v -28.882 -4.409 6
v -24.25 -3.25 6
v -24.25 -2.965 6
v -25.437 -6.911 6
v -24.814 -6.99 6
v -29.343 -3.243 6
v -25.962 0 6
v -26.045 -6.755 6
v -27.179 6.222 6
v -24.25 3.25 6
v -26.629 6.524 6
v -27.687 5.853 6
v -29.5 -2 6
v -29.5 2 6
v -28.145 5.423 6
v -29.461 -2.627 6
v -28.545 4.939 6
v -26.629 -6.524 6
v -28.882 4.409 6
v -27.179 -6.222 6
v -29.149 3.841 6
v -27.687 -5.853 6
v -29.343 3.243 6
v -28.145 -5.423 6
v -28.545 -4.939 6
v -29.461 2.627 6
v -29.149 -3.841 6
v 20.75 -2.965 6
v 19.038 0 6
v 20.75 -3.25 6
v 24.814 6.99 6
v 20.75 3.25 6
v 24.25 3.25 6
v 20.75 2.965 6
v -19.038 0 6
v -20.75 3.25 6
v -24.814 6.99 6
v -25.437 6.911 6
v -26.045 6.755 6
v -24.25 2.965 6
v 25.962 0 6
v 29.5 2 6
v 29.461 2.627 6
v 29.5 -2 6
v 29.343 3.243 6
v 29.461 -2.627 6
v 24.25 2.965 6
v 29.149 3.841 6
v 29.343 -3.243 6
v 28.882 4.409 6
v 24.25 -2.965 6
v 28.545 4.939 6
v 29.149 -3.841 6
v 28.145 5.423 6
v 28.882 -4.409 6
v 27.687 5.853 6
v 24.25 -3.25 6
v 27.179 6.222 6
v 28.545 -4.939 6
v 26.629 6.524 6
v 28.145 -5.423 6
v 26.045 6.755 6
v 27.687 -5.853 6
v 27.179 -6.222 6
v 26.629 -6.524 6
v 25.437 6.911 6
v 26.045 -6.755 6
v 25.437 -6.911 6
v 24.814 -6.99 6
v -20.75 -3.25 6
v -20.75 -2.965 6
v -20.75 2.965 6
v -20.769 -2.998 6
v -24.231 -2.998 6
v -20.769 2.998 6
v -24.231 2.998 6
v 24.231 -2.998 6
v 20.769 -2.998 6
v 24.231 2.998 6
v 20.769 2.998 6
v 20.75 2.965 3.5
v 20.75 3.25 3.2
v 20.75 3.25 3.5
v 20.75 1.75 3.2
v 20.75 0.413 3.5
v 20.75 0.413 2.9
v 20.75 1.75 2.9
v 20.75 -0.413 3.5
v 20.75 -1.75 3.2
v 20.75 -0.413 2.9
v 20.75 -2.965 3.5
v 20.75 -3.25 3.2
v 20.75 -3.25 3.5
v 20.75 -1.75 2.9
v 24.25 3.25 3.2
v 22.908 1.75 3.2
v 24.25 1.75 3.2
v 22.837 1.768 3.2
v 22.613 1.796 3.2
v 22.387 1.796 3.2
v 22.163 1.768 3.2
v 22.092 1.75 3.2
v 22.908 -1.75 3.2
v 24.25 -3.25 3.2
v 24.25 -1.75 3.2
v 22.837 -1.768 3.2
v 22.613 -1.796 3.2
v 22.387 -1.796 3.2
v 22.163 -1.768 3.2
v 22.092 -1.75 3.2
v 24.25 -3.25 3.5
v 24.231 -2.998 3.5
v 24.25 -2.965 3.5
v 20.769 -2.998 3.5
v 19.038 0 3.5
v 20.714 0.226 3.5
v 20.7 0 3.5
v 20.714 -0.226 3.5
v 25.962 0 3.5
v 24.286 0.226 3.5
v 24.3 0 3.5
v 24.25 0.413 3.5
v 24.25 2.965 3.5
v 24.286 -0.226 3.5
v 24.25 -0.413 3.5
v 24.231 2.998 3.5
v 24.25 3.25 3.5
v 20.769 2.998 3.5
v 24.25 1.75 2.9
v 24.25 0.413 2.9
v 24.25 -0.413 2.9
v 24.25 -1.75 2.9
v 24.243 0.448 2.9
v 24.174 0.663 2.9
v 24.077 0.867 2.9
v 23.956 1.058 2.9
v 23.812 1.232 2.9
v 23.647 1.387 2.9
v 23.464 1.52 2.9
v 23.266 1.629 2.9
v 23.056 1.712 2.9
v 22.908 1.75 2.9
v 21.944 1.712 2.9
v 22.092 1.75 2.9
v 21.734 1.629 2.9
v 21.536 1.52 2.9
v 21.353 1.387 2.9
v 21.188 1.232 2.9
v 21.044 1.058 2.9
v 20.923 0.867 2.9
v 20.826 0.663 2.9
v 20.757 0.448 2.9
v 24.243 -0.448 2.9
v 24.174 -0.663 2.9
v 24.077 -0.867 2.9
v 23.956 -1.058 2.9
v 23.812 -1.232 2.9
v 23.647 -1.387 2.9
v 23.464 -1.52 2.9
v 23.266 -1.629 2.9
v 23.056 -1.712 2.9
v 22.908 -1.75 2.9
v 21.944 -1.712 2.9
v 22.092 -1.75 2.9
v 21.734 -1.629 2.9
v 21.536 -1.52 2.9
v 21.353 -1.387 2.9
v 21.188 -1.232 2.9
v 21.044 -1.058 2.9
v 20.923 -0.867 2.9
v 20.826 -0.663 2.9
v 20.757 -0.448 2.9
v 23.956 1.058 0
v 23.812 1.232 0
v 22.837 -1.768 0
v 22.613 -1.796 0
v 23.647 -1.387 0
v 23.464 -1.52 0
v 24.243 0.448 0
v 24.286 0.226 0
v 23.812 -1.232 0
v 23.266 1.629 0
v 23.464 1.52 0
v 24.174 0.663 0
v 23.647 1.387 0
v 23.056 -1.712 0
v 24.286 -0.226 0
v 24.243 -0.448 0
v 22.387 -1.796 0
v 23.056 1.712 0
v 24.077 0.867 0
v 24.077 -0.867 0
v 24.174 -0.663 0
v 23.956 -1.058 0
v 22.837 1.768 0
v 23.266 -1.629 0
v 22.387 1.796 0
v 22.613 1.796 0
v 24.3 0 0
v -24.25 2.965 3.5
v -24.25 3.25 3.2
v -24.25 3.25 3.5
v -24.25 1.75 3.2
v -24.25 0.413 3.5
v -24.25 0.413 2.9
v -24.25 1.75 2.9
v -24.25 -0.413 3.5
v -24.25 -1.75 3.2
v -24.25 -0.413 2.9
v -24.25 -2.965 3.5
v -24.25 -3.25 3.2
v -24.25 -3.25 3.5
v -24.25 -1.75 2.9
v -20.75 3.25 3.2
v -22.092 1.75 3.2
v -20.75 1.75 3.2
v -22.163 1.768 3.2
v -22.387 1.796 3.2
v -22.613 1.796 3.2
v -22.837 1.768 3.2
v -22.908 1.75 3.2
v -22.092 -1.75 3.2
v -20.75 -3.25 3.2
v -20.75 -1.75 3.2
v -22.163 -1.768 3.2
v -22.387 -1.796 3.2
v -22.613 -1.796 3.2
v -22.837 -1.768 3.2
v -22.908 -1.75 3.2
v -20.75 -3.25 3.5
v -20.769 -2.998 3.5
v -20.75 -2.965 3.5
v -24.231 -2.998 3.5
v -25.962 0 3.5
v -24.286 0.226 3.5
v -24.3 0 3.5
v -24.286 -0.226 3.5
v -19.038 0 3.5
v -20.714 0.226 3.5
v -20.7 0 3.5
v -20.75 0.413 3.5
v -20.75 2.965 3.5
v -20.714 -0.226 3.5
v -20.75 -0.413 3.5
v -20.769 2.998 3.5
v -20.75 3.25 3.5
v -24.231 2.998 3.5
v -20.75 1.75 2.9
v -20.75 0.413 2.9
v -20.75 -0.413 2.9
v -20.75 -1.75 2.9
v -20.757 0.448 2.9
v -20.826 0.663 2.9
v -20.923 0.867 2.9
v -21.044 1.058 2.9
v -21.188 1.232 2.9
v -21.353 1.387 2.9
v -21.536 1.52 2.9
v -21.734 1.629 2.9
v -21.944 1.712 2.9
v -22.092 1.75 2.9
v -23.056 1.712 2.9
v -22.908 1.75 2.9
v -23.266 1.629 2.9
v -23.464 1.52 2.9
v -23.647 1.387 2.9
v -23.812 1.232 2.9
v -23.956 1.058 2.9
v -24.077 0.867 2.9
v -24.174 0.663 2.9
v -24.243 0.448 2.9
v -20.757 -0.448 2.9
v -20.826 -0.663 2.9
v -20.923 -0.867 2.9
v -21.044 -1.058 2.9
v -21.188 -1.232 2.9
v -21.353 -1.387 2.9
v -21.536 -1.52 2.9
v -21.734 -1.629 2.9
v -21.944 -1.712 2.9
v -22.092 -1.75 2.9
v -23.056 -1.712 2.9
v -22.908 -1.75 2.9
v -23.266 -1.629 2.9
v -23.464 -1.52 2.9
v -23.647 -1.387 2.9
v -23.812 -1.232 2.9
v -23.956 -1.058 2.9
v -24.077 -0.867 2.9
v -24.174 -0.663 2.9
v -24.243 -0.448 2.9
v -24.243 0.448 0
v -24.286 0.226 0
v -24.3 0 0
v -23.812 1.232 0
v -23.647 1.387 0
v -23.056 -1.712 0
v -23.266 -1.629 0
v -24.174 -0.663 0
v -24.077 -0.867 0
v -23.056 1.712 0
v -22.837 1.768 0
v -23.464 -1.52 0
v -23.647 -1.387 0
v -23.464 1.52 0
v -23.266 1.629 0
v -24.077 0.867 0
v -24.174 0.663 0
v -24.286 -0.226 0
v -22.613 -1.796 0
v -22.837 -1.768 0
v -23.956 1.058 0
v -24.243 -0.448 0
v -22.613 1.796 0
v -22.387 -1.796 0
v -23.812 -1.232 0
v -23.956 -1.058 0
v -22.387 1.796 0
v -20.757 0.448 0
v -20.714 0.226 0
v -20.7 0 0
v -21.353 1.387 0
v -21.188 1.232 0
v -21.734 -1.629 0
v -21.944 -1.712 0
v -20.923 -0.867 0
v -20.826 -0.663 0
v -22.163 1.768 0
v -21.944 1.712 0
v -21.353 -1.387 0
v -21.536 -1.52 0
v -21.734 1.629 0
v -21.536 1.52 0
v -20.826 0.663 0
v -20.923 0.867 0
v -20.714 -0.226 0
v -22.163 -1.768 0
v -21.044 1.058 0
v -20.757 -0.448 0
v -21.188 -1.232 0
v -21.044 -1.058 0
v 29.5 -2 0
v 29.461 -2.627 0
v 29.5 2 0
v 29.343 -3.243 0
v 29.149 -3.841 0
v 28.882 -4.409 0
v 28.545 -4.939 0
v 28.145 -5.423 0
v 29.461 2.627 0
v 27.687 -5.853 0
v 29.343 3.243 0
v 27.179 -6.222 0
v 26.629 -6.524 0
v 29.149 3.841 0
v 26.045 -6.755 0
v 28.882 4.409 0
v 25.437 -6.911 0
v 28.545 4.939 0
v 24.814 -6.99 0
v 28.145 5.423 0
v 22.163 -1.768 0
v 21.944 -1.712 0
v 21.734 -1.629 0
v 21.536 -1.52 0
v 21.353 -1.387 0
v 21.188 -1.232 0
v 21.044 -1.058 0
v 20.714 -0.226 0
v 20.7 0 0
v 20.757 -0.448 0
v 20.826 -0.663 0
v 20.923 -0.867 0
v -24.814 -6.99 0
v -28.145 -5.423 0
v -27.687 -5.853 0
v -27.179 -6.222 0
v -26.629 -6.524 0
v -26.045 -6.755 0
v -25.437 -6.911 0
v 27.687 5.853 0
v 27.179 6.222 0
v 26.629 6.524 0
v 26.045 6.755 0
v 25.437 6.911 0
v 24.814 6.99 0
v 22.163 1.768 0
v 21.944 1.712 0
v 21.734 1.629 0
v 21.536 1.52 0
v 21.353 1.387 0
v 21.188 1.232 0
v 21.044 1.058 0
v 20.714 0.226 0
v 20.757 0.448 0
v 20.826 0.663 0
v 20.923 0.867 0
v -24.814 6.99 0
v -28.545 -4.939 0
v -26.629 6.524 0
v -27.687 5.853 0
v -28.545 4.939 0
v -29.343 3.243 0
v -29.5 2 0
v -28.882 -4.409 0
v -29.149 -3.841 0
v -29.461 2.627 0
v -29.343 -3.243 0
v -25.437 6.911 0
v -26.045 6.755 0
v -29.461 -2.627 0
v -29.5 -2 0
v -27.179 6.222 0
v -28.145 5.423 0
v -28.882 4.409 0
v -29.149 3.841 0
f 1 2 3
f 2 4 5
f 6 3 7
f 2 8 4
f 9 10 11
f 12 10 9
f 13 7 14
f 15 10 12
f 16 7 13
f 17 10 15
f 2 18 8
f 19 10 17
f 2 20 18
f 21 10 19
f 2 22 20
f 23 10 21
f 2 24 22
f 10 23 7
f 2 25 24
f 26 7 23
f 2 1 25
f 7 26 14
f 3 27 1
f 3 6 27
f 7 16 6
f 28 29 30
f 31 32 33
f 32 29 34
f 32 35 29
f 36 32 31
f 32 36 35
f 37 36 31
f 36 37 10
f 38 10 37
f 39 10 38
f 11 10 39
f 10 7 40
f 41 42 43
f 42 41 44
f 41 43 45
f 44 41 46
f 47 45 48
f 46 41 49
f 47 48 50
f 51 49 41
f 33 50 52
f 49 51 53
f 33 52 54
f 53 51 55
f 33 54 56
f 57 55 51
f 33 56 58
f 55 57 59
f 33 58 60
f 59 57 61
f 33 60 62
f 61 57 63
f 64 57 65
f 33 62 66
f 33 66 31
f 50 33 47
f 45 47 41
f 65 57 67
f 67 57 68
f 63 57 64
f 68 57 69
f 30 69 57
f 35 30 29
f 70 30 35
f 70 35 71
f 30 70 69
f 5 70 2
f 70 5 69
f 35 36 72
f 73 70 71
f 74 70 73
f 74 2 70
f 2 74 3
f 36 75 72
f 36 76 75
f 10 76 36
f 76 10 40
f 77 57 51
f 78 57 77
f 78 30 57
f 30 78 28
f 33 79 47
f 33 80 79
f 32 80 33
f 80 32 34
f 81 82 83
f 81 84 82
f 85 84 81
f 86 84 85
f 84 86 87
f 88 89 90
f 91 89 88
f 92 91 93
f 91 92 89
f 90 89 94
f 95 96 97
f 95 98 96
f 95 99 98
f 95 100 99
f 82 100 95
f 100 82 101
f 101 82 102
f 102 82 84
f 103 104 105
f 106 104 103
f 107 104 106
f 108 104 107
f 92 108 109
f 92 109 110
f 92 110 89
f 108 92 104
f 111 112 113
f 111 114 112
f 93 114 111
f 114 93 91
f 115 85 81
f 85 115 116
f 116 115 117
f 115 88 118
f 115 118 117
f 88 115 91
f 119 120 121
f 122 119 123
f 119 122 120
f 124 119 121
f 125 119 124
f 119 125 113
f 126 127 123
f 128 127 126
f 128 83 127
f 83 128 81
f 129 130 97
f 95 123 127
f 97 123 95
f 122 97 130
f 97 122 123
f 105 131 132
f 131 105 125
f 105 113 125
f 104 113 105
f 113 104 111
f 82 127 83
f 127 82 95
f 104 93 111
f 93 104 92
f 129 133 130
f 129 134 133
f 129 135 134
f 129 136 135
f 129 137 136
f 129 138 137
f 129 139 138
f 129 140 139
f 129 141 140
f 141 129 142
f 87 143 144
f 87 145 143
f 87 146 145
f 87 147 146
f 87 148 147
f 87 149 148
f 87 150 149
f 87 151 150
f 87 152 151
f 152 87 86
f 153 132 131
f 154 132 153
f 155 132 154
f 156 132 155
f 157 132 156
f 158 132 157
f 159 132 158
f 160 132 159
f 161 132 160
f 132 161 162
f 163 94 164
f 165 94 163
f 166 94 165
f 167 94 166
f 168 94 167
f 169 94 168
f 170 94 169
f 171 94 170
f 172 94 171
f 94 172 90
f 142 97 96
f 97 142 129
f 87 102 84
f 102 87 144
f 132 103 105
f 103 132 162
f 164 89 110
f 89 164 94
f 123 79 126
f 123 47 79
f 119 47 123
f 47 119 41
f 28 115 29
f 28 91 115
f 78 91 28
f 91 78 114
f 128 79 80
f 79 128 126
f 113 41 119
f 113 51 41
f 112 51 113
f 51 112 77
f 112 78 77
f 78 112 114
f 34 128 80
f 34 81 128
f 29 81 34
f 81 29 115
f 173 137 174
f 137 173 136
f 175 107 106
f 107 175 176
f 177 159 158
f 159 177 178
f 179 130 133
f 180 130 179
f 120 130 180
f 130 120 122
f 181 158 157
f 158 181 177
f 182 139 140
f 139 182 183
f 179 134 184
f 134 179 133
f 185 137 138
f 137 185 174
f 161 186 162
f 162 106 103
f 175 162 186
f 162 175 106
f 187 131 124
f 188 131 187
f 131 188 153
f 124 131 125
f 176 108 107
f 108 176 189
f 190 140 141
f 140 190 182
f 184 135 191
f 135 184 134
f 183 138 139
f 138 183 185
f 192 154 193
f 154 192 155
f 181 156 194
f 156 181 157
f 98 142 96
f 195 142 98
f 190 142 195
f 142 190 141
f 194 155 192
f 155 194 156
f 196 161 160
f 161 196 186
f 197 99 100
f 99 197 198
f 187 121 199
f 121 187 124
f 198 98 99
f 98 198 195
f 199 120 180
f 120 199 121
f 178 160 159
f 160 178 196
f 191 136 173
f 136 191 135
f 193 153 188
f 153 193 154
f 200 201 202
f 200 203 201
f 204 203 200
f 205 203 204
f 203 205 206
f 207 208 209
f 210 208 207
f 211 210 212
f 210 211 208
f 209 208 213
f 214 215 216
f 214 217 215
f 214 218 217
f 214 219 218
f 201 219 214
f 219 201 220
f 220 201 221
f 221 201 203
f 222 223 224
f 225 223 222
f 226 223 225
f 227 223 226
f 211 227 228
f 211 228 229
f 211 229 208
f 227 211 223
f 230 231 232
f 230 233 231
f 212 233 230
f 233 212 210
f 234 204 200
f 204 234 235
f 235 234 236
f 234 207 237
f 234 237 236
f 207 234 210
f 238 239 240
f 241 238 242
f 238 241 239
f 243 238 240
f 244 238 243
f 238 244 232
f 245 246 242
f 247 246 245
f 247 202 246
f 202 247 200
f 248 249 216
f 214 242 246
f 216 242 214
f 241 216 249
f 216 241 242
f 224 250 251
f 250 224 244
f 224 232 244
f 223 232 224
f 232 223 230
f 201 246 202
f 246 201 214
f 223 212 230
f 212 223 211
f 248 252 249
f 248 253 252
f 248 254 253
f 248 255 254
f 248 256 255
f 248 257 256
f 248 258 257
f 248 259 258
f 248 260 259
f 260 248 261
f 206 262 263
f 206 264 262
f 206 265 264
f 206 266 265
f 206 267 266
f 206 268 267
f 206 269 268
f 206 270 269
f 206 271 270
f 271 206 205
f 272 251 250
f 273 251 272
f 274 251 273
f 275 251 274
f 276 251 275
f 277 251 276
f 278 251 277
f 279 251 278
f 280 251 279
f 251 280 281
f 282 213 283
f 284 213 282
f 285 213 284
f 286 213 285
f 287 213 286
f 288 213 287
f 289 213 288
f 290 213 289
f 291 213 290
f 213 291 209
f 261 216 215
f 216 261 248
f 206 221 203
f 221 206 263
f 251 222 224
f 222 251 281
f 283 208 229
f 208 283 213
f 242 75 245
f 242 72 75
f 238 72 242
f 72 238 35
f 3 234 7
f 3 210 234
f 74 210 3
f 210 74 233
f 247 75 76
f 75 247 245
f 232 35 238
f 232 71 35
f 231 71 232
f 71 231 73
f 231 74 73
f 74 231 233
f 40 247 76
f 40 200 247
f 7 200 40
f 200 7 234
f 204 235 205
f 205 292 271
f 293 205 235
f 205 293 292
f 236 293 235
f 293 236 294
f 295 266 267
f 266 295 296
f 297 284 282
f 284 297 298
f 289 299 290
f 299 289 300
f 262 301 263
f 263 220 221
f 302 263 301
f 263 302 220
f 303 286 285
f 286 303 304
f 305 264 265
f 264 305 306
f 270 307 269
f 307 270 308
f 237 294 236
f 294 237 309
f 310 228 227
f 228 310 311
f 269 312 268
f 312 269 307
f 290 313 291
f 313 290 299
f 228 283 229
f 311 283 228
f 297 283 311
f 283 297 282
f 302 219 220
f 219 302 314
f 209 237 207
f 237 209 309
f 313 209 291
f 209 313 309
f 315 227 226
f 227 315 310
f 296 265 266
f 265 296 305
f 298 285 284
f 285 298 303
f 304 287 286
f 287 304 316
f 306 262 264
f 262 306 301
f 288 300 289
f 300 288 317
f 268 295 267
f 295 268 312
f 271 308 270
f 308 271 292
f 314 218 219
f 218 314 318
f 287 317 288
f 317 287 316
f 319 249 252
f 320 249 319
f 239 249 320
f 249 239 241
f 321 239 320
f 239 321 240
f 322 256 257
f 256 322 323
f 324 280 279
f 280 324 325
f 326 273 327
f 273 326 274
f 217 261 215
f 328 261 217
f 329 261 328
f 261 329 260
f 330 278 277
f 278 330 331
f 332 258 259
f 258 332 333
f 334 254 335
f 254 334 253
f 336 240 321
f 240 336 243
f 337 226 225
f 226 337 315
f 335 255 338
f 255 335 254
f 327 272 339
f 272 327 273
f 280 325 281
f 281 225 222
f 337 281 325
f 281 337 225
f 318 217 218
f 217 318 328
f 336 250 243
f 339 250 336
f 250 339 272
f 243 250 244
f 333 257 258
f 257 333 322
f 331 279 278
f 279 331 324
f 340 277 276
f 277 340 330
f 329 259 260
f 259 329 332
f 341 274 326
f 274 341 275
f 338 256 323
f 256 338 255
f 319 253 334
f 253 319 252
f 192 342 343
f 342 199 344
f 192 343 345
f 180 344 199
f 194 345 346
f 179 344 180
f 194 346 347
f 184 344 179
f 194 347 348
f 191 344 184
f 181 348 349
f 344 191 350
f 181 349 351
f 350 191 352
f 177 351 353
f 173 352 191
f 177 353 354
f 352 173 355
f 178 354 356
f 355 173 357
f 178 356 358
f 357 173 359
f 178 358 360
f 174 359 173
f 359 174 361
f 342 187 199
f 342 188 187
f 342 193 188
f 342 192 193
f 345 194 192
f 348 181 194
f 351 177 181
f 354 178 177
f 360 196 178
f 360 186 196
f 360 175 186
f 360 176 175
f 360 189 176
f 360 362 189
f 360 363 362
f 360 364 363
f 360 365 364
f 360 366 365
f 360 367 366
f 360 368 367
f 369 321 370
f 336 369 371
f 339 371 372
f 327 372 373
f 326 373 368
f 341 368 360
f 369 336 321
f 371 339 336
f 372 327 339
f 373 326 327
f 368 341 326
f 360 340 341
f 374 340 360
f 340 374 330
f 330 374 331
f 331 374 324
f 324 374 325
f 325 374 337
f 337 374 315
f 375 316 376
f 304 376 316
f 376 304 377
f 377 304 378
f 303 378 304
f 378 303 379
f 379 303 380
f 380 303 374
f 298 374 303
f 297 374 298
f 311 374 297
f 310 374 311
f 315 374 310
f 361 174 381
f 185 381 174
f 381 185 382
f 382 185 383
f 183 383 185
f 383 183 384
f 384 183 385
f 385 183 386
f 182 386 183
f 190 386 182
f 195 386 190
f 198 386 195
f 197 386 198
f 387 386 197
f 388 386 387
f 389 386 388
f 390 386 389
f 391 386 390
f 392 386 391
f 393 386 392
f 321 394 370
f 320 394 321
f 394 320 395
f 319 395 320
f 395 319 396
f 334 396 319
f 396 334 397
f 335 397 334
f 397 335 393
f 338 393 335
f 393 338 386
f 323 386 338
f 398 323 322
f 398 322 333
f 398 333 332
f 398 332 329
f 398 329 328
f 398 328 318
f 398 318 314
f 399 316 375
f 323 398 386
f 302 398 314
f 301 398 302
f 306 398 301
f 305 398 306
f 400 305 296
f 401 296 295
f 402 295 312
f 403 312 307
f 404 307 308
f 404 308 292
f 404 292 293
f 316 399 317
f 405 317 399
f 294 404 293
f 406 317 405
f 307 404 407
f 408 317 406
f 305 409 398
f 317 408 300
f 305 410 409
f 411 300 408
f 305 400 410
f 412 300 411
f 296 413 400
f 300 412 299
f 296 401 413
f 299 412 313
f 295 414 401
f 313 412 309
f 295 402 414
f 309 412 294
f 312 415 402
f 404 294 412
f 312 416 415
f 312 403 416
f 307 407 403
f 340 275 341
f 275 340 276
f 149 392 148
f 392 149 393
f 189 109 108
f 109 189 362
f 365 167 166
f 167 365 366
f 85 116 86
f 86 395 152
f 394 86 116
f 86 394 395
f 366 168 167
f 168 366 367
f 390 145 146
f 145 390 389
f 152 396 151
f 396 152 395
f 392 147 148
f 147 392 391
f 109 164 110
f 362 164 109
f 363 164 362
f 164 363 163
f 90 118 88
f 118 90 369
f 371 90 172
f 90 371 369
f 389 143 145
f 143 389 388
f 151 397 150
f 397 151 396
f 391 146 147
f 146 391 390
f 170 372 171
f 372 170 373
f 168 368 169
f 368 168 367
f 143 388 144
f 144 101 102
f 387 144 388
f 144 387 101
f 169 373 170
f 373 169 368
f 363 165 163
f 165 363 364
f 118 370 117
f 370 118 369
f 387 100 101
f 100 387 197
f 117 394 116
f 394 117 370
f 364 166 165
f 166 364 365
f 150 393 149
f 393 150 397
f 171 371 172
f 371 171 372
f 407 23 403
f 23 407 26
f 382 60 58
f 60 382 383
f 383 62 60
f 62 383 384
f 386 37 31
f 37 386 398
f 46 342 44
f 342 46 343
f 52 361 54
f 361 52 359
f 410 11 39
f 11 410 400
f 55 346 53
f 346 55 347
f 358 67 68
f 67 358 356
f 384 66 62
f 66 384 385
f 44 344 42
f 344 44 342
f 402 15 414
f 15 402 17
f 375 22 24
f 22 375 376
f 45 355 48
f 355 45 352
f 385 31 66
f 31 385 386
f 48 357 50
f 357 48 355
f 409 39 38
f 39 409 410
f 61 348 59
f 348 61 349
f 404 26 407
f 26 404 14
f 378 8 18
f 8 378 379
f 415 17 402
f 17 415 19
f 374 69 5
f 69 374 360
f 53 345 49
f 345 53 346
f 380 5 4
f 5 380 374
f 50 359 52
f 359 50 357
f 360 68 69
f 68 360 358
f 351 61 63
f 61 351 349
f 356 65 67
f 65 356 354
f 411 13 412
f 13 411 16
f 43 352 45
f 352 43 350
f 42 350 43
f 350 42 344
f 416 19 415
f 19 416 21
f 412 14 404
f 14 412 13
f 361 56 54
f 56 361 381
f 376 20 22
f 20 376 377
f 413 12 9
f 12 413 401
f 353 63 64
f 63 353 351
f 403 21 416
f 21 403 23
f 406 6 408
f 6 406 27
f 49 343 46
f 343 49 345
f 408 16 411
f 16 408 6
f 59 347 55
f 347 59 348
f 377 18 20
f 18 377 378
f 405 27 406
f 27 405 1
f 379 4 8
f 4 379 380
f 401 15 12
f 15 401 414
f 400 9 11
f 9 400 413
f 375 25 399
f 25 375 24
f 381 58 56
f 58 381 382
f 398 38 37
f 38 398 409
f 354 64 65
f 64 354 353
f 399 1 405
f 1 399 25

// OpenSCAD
$fn = 50;


difference() {
	union() {
		hull() {
			translate(v = [-24.5000000000, 2.0000000000, 0]) {
				cylinder(h = 6, r = 5);
			}
			translate(v = [24.5000000000, 2.0000000000, 0]) {
				cylinder(h = 6, r = 5);
			}
			translate(v = [-24.5000000000, -2.0000000000, 0]) {
				cylinder(h = 6, r = 5);
			}
			translate(v = [24.5000000000, -2.0000000000, 0]) {
				cylinder(h = 6, r = 5);
			}
		}
	}
	union() {
		translate(v = [22.5000000000, 0, -20]) {
			rotate(a = [0, 180, 0]) {
				difference() {
					union() {
						translate(v = [0, 0, -26.0000000000]) {
							rotate(a = [0, 0, 0]) {
								difference() {
									union() {
										#translate(v = [-1.7500000000, -3.2500000000, -0.3000000000]) {
											cube(size = [3.5000000000, 6.5000000000, 0.3000000000]);
										}
										#translate(v = [-1.7500000000, -1.7500000000, -0.6000000000]) {
											cube(size = [3.5000000000, 3.5000000000, 0.3000000000]);
										}
										#translate(v = [-1.7500000000, -3.2500000000, 2.5000000000]) {
											cube(size = [3.5000000000, 6.5000000000, 0.3000000000]);
										}
										#translate(v = [-1.7500000000, -1.7500000000, 2.8000000000]) {
											cube(size = [3.5000000000, 3.5000000000, 0.3000000000]);
										}
										#linear_extrude(height = 2.5000000000) {
											polygon(points = [[3.4620000000, 0.0000000000], [1.7310000000, 2.9981799479], [-1.7310000000, 2.9981799479], [-3.4620000000, 0.0000000000], [-1.7310000000, -2.9981799479], [1.7310000000, -2.9981799479]]);
										}
										#translate(v = [-1.7500000000, -3.2500000000, -0.3000000000]) {
											cube(size = [3.5000000000, 6.5000000000, 0.3000000000]);
										}
										#translate(v = [-1.7500000000, -1.7500000000, -0.6000000000]) {
											cube(size = [3.5000000000, 3.5000000000, 0.3000000000]);
										}
										#translate(v = [-1.7500000000, -3.2500000000, 2.5000000000]) {
											cube(size = [3.5000000000, 6.5000000000, 0.3000000000]);
										}
										#translate(v = [-1.7500000000, -1.7500000000, 2.8000000000]) {
											cube(size = [3.5000000000, 3.5000000000, 0.3000000000]);
										}
										#translate(v = [-1.7500000000, -3.2500000000, -0.3000000000]) {
											cube(size = [3.5000000000, 6.5000000000, 0.3000000000]);
										}
										#translate(v = [-1.7500000000, -1.7500000000, -0.6000000000]) {
											cube(size = [3.5000000000, 3.5000000000, 0.3000000000]);
										}
										#translate(v = [-1.7500000000, -3.2500000000, 2.5000000000]) {
											cube(size = [3.5000000000, 6.5000000000, 0.3000000000]);
										}
										#translate(v = [-1.7500000000, -1.7500000000, 2.8000000000]) {
											cube(size = [3.5000000000, 3.5000000000, 0.3000000000]);
										}
									}
									union();
								}
							}
						}
						translate(v = [0, 0, -26.0000000000]) {
							rotate(a = [0, 0, 0]) {
								difference() {
									union() {
										#translate(v = [-1.7500000000, -3.2500000000, -0.3000000000]) {
											cube(size = [3.5000000000, 6.5000000000, 0.3000000000]);
										}
										#translate(v = [-1.7500000000, -1.7500000000, -0.6000000000]) {
											cube(size = [3.5000000000, 3.5000000000, 0.3000000000]);
										}
										#translate(v = [-1.7500000000, -3.2500000000, 2.5000000000]) {
											cube(size = [3.5000000000, 6.5000000000, 0.3000000000]);
										}
										#translate(v = [-1.7500000000, -1.7500000000, 2.8000000000]) {
											cube(size = [3.5000000000, 3.5000000000, 0.3000000000]);
										}
										#linear_extrude(height = 2.5000000000) {
											polygon(points = [[3.4620000000, 0.0000000000], [1.7310000000, 2.9981799479], [-1.7310000000, 2.9981799479], [-3.4620000000, 0.0000000000], [-1.7310000000, -2.9981799479], [1.7310000000, -2.9981799479]]);
										}
										#translate(v = [-1.7500000000, -3.2500000000, -0.3000000000]) {
											cube(size = [3.5000000000, 6.5000000000, 0.3000000000]);
										}
										#translate(v = [-1.7500000000, -1.7500000000, -0.6000000000]) {
											cube(size = [3.5000000000, 3.5000000000, 0.3000000000]);
										}
										#translate(v = [-1.7500000000, -3.2500000000, 2.5000000000]) {
											cube(size = [3.5000000000, 6.5000000000, 0.3000000000]);
										}
										#translate(v = [-1.7500000000, -1.7500000000, 2.8000000000]) {
											cube(size = [3.5000000000, 3.5000000000, 0.3000000000]);
										}
										#translate(v = [-1.7500000000, -3.2500000000, -0.3000000000]) {
											cube(size = [3.5000000000, 6.5000000000, 0.3000000000]);
										}
										#translate(v = [-1.7500000000, -1.7500000000, -0.6000000000]) {
											cube(size = [3.5000000000, 3.5000000000, 0.3000000000]);
										}
										#translate(v = [-1.7500000000, -3.2500000000, 2.5000000000]) {
											cube(size = [3.5000000000, 6.5000000000, 0.3000000000]);
										}
										#translate(v = [-1.7500000000, -1.7500000000, 2.8000000000]) {
											cube(size = [3.5000000000, 3.5000000000, 0.3000000000]);
										}
									}
									union();
								}
							}
						}
						translate(v = [0, 0, -26.0000000000]) {
							rotate(a = [0, 0, 0]) {
								difference() {
									union() {
										#translate(v = [-1.7500000000, -3.2500000000, -0.3000000000]) {
											cube(size = [3.5000000000, 6.5000000000, 0.3000000000]);
										}
										#translate(v = [-1.7500000000, -1.7500000000, -0.6000000000]) {
											cube(size = [3.5000000000, 3.5000000000, 0.3000000000]);
										}
										#translate(v = [-1.7500000000, -3.2500000000, 2.5000000000]) {
											cube(size = [3.5000000000, 6.5000000000, 0.3000000000]);
										}
										#translate(v = [-1.7500000000, -1.7500000000, 2.8000000000]) {
											cube(size = [3.5000000000, 3.5000000000, 0.3000000000]);
										}
										#linear_extrude(height = 2.5000000000) {
											polygon(points = [[3.4620000000, 0.0000000000], [1.7310000000, 2.9981799479], [-1.7310000000, 2.9981799479], [-3.4620000000, 0.0000000000], [-1.7310000000, -2.9981799479], [1.7310000000, -2.9981799479]]);
										}
										#translate(v = [-1.7500000000, -3.2500000000, -0.3000000000]) {
											cube(size = [3.5000000000, 6.5000000000, 0.3000000000]);
										}
										#translate(v = [-1.7500000000, -1.7500000000, -0.6000000000]) {
											cube(size = [3.5000000000, 3.5000000000, 0.3000000000]);
										}
										#translate(v = [-1.7500000000, -3.2500000000, 2.5000000000]) {
											cube(size = [3.5000000000, 6.5000000000, 0.3000000000]);
										}
										#translate(v = [-1.7500000000, -1.7500000000, 2.8000000000]) {
											cube(size = [3.5000000000, 3.5000000000, 0.3000000000]);
										}
										#translate(v = [-1.7500000000, -3.2500000000, -0.3000000000]) {
											cube(size = [3.5000000000, 6.5000000000, 0.3000000000]);
										}
										#translate(v = [-1.7500000000, -1.7500000000, -0.6000000000]) {
											cube(size = [3.5000000000, 3.5000000000, 0.3000000000]);
										}
										#translate(v = [-1.7500000000, -3.2500000000, 2.5000000000]) {
											cube(size = [3.5000000000, 6.5000000000, 0.3000000000]);
										}
										#translate(v = [-1.7500000000, -1.7500000000, 2.8000000000]) {
											cube(size = [3.5000000000, 3.5000000000, 0.3000000000]);
										}
									}
									union();
								}
							}
						}
						#translate(v = [0, 0, -26.0000000000]) {
							cylinder(h = 26, r = 1.5000000000);
						}
						#translate(v = [0, 0, -1.9000000000]) {
							cylinder(h = 1.9000000000, r1 = 1.8000000000, r2 = 3.6000000000);
						}
						#translate(v = [0, 0, -26.0000000000]) {
							cylinder(h = 26, r = 1.8000000000);
						}
						#translate(v = [0, 0, -26.0000000000]) {
							cylinder(h = 26, r = 1.5000000000);
						}
					}
					union();
				}
			}
		}
		translate(v = [-22.5000000000, 0, -20]) {
			rotate(a = [0, 180, 0]) {
				difference() {
					union() {
						translate(v = [0, 0, -26.0000000000]) {
							rotate(a = [0, 0, 0]) {
								difference() {
									union() {
										#translate(v = [-1.7500000000, -3.2500000000, -0.3000000000]) {
											cube(size = [3.5000000000, 6.5000000000, 0.3000000000]);
										}
										#translate(v = [-1.7500000000, -1.7500000000, -0.6000000000]) {
											cube(size = [3.5000000000, 3.5000000000, 0.3000000000]);
										}
										#translate(v = [-1.7500000000, -3.2500000000, 2.5000000000]) {
											cube(size = [3.5000000000, 6.5000000000, 0.3000000000]);
										}
										#translate(v = [-1.7500000000, -1.7500000000, 2.8000000000]) {
											cube(size = [3.5000000000, 3.5000000000, 0.3000000000]);
										}
										#linear_extrude(height = 2.5000000000) {
											polygon(points = [[3.4620000000, 0.0000000000], [1.7310000000, 2.9981799479], [-1.7310000000, 2.9981799479], [-3.4620000000, 0.0000000000], [-1.7310000000, -2.9981799479], [1.7310000000, -2.9981799479]]);
										}
										#translate(v = [-1.7500000000, -3.2500000000, -0.3000000000]) {
											cube(size = [3.5000000000, 6.5000000000, 0.3000000000]);
										}
										#translate(v = [-1.7500000000, -1.7500000000, -0.6000000000]) {
											cube(size = [3.5000000000, 3.5000000000, 0.3000000000]);
										}
										#translate(v = [-1.7500000000, -3.2500000000, 2.5000000000]) {
											cube(size = [3.5000000000, 6.5000000000, 0.3000000000]);
										}
										#translate(v = [-1.7500000000, -1.7500000000, 2.8000000000]) {
											cube(size = [3.5000000000, 3.5000000000, 0.3000000000]);
										}
										#translate(v = [-1.7500000000, -3.2500000000, -0.3000000000]) {
											cube(size = [3.5000000000, 6.5000000000, 0.3000000000]);
										}
										#translate(v = [-1.7500000000, -1.7500000000, -0.6000000000]) {
											cube(size = [3.5000000000, 3.5000000000, 0.3000000000]);
										}
										#translate(v = [-1.7500000000, -3.2500000000, 2.5000000000]) {
											cube(size = [3.5000000000, 6.5000000000, 0.3000000000]);
										}
										#translate(v = [-1.7500000000, -1.7500000000, 2.8000000000]) {
											cube(size = [3.5000000000, 3.5000000000, 0.3000000000]);
										}
									}
									union();
								}
							}
						}
						translate(v = [0, 0, -26.0000000000]) {
							rotate(a = [0, 0, 0]) {
								difference() {
									union() {
										#translate(v = [-1.7500000000, -3.2500000000, -0.3000000000]) {
											cube(size = [3.5000000000, 6.5000000000, 0.3000000000]);
										}
										#translate(v = [-1.7500000000, -1.7500000000, -0.6000000000]) {
											cube(size = [3.5000000000, 3.5000000000, 0.3000000000]);
										}
										#translate(v = [-1.7500000000, -3.2500000000, 2.5000000000]) {
											cube(size = [3.5000000000, 6.5000000000, 0.3000000000]);
										}
										#translate(v = [-1.7500000000, -1.7500000000, 2.8000000000]) {
											cube(size = [3.5000000000, 3.5000000000, 0.3000000000]);
										}
										#linear_extrude(height = 2.5000000000) {
											polygon(points = [[3.4620000000, 0.0000000000], [1.7310000000, 2.9981799479], [-1.7310000000, 2.9981799479], [-3.4620000000, 0.0000000000], [-1.7310000000, -2.9981799479], [1.7310000000, -2.9981799479]]);
										}
										#translate(v = [-1.7500000000, -3.2500000000, -0.3000000000]) {
											cube(size = [3.5000000000, 6.5000000000, 0.3000000000]);
										}
										#translate(v = [-1.7500000000, -1.7500000000, -0.6000000000]) {
											cube(size = [3.5000000000, 3.5000000000, 0.3000000000]);
										}
										#translate(v = [-1.7500000000, -3.2500000000, 2.5000000000]) {
											cube(size = [3.5000000000, 6.5000000000, 0.3000000000]);
										}
										#translate(v = [-1.7500000000, -1.7500000000, 2.8000000000]) {
											cube(size = [3.5000000000, 3.5000000000, 0.3000000000]);
										}
										#translate(v = [-1.7500000000, -3.2500000000, -0.3000000000]) {
											cube(size = [3.5000000000, 6.5000000000, 0.3000000000]);
										}
										#translate(v = [-1.7500000000, -1.7500000000, -0.6000000000]) {
											cube(size = [3.5000000000, 3.5000000000, 0.3000000000]);
										}
										#translate(v = [-1.7500000000, -3.2500000000, 2.5000000000]) {
											cube(size = [3.5000000000, 6.5000000000, 0.3000000000]);
										}
										#translate(v = [-1.7500000000, -1.7500000000, 2.8000000000]) {
											cube(size = [3.5000000000, 3.5000000000, 0.3000000000]);
										}
									}
									union();
								}
							}
						}
						translate(v = [0, 0, -26.0000000000]) {
							rotate(a = [0, 0, 0]) {
								difference() {
									union() {
										#translate(v = [-1.7500000000, -3.2500000000, -0.3000000000]) {
											cube(size = [3.5000000000, 6.5000000000, 0.3000000000]);
										}
										#translate(v = [-1.7500000000, -1.7500000000, -0.6000000000]) {
											cube(size = [3.5000000000, 3.5000000000, 0.3000000000]);
										}
										#translate(v = [-1.7500000000, -3.2500000000, 2.5000000000]) {
											cube(size = [3.5000000000, 6.5000000000, 0.3000000000]);
										}
										#translate(v = [-1.7500000000, -1.7500000000, 2.8000000000]) {
											cube(size = [3.5000000000, 3.5000000000, 0.3000000000]);
										}
										#linear_extrude(height = 2.5000000000) {
											polygon(points = [[3.4620000000, 0.0000000000], [1.7310000000, 2.9981799479], [-1.7310000000, 2.9981799479], [-3.4620000000, 0.0000000000], [-1.7310000000, -2.9981799479], [1.7310000000, -2.9981799479]]);
										}
										#translate(v = [-1.7500000000, -3.2500000000, -0.3000000000]) {
											cube(size = [3.5000000000, 6.5000000000, 0.3000000000]);
										}
										#translate(v = [-1.7500000000, -1.7500000000, -0.6000000000]) {
											cube(size = [3.5000000000, 3.5000000000, 0.3000000000]);
										}
										#translate(v = [-1.7500000000, -3.2500000000, 2.5000000000]) {
											cube(size = [3.5000000000, 6.5000000000, 0.3000000000]);
										}
										#translate(v = [-1.7500000000, -1.7500000000, 2.8000000000]) {
											cube(size = [3.5000000000, 3.5000000000, 0.3000000000]);
										}
										#translate(v = [-1.7500000000, -3.2500000000, -0.3000000000]) {
											cube(size = [3.5000000000, 6.5000000000, 0.3000000000]);
										}
										#translate(v = [-1.7500000000, -1.7500000000, -0.6000000000]) {
											cube(size = [3.5000000000, 3.5000000000, 0.3000000000]);
										}
										#translate(v = [-1.7500000000, -3.2500000000, 2.5000000000]) {
											cube(size = [3.5000000000, 6.5000000000, 0.3000000000]);
										}
										#translate(v = [-1.7500000000, -1.7500000000, 2.8000000000]) {
											cube(size = [3.5000000000, 3.5000000000, 0.3000000000]);
										}
									}
									union();
								}
							}
						}
						#translate(v = [0, 0, -26.0000000000]) {
							cylinder(h = 26, r = 1.5000000000);
						}
						#translate(v = [0, 0, -1.9000000000]) {
							cylinder(h = 1.9000000000, r1 = 1.8000000000, r2 = 3.6000000000);
						}
						#translate(v = [0, 0, -26.0000000000]) {
							cylinder(h = 26, r = 1.8000000000);
						}
						#translate(v = [0, 0, -26.0000000000]) {
							cylinder(h = 26, r = 1.5000000000);
						}
					}
					union();
				}
			}
		}
		translate(v = [-22.5000000000, 0.0000000000, 0]) {
			cylinder(h = 6, r = 1.8000000000);
		}
		translate(v = [22.5000000000, 0.0000000000, 0]) {
			cylinder(h = 6, r = 1.8000000000);
		}
		translate(v = [-22.5000000000, 0.0000000000, 0]) {
			cylinder(h = 6, r = 1.8000000000);
		}
		translate(v = [22.5000000000, 0.0000000000, 0]) {
			cylinder(h = 6, r = 1.8000000000);
		}
		translate(v = [-22.5000000000, 0.0000000000, 0]) {
			cylinder(h = 6, r = 1.8000000000);
		}
		translate(v = [22.5000000000, 0.0000000000, 0]) {
			cylinder(h = 6, r = 1.8000000000);
		}
		translate(v = [-22.5000000000, 0.0000000000, 0]) {
			cylinder(h = 6, r = 1.8000000000);
		}
		translate(v = [22.5000000000, 0.0000000000, 0]) {
			cylinder(h = 6, r = 1.8000000000);
		}
	}
}
